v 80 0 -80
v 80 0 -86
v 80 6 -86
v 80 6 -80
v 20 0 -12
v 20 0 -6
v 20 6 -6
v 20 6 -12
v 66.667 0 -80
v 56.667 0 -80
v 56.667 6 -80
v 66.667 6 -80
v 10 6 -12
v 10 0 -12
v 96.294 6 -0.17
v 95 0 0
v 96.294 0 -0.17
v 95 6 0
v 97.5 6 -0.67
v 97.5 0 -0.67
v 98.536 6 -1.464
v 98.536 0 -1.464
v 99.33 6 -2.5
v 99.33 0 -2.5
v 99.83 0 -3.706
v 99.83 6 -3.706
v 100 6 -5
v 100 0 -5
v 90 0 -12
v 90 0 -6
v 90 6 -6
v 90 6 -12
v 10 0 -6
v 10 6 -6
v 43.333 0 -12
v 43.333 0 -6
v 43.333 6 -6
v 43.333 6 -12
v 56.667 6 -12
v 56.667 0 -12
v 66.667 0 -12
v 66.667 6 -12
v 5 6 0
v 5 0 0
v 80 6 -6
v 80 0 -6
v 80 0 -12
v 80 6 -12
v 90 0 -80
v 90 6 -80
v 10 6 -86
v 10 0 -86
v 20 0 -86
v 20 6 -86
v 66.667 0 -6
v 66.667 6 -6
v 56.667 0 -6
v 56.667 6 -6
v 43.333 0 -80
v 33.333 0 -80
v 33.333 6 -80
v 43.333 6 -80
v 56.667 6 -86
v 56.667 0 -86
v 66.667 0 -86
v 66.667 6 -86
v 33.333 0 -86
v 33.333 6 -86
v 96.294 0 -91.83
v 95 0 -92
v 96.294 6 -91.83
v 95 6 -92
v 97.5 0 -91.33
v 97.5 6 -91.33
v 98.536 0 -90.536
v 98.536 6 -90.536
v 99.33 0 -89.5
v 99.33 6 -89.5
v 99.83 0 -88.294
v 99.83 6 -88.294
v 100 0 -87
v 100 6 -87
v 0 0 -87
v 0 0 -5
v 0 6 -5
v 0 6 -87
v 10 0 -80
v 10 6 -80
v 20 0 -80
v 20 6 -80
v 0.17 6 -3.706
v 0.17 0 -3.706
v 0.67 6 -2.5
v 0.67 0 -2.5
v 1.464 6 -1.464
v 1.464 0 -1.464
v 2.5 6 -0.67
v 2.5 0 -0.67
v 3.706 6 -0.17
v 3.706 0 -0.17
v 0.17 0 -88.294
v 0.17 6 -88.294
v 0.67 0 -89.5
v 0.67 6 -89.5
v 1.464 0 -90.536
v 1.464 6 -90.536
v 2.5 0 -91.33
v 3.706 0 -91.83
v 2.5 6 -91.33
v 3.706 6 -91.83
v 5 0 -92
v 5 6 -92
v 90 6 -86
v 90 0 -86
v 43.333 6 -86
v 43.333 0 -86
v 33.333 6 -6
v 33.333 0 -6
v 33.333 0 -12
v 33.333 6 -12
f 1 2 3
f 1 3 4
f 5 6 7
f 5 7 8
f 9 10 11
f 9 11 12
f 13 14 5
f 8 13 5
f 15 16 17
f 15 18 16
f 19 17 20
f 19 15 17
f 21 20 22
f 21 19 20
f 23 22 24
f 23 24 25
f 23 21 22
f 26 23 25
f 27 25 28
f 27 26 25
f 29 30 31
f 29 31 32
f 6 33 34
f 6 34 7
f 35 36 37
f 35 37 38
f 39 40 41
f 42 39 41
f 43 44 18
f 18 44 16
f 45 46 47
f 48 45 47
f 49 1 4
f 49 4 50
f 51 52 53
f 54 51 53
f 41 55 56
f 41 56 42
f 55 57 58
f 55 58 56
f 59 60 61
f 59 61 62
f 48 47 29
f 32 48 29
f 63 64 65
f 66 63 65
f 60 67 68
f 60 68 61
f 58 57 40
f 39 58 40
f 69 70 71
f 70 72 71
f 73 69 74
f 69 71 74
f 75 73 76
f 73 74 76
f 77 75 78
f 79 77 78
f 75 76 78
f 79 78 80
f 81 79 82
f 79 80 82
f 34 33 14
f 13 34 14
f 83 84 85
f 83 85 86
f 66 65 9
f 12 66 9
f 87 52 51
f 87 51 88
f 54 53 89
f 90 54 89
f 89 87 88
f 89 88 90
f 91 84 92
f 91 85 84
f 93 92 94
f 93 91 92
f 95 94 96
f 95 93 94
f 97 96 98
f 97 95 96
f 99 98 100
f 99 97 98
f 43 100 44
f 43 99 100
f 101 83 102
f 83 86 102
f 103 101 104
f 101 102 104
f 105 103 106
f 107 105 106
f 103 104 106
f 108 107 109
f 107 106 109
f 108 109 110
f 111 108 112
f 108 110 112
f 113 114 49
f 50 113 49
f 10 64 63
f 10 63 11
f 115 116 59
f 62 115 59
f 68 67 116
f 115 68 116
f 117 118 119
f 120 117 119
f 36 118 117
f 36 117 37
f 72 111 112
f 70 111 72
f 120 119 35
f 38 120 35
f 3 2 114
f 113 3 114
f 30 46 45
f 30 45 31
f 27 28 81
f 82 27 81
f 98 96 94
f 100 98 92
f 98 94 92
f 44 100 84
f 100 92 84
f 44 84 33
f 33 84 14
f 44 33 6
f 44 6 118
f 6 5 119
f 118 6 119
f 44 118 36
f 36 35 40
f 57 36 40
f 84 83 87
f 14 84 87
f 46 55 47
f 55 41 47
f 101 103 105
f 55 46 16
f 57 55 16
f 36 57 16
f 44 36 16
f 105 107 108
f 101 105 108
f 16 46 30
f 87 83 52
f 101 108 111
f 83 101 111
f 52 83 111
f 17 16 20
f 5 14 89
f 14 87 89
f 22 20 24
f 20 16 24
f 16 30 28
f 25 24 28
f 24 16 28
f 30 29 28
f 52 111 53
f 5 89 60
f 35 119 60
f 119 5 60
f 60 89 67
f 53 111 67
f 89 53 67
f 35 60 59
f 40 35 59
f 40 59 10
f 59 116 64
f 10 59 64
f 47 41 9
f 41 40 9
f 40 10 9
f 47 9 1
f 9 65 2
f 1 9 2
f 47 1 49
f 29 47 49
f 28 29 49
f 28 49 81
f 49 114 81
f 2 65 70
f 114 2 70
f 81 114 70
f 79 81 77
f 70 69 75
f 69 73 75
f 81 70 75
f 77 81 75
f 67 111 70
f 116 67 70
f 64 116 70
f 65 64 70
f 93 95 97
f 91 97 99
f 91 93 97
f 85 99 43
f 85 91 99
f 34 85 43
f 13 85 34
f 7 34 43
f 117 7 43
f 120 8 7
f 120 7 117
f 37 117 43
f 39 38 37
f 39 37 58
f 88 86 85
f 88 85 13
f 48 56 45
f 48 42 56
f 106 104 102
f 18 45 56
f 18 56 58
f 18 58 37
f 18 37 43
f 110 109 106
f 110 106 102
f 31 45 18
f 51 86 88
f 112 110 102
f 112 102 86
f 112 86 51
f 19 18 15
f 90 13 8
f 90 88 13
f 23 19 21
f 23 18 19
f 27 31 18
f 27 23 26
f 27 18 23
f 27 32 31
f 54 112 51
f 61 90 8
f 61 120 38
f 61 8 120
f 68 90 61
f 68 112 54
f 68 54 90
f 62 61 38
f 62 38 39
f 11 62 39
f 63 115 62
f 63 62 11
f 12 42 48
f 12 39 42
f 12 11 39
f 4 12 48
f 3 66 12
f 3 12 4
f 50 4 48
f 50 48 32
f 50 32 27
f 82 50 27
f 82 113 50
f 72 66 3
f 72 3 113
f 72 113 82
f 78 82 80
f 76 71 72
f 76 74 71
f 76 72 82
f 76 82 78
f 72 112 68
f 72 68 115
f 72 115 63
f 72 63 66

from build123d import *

# Parameters (mm, degrees)
SKETCH1_W           = 100
SKETCH1_H           = 92
BOSS_EXTRUDE1_DEPTH = 6
SKETCH6_W           = 10
SKETCH6_H           = 6
CUT_EXTRUDE1_DEPTH  = 4
SKETCH61_W          = 10
SKETCH61_H          = 6
CUT_EXTRUDE11_DEPTH = 4
SKETCH62_W          = 10
SKETCH62_H          = 6
CUT_EXTRUDE12_DEPTH = 4
SKETCH63_W          = 10
SKETCH63_H          = 6
CUT_EXTRUDE13_DEPTH = 4
FILLET1_R           = 5


with BuildPart() as part:
    # Sketch1 → Boss-Extrude1 (new body)
    with BuildSketch(Plane(origin=(0, 0, 0), x_dir=(1, 0, 0), z_dir=(0, 1, 0))):
        with Locations((50, 46)):
            Rectangle(SKETCH1_W, SKETCH1_H)
    extrude(amount=BOSS_EXTRUDE1_DEPTH)

    # Sketch6 → Cut-Extrude1 (cut, symmetric)
    with BuildSketch(Plane(origin=(84.232221392, 3, -39), x_dir=(1, 0, 0), z_dir=(0, -1, 0))):
        with Locations((0.767778608, -44)):
            Rectangle(SKETCH6_W, SKETCH6_H)
    cut_extrude1 = extrude(amount=CUT_EXTRUDE1_DEPTH, both=True, mode=Mode.SUBTRACT)

    # Sketch61 → Cut-Extrude11 (cut, symmetric)
    with BuildSketch(Plane(origin=(60.898888059, 3, -39), x_dir=(1, 0, 0), z_dir=(0, -1, 0))):
        with Locations((0.767778608, -44)):
            Rectangle(SKETCH61_W, SKETCH61_H)
    cut_extrude11 = extrude(amount=CUT_EXTRUDE11_DEPTH, both=True, mode=Mode.SUBTRACT)

    # Sketch62 → Cut-Extrude12 (cut, symmetric)
    with BuildSketch(Plane(origin=(37.565554726, 3, -39), x_dir=(1, 0, 0), z_dir=(0, -1, 0))):
        with Locations((0.767778608, -44)):
            Rectangle(SKETCH62_W, SKETCH62_H)
    cut_extrude12 = extrude(amount=CUT_EXTRUDE12_DEPTH, both=True, mode=Mode.SUBTRACT)

    # Sketch63 → Cut-Extrude13 (cut, symmetric)
    with BuildSketch(Plane(origin=(14.232221392, 3, -39), x_dir=(1, 0, 0), z_dir=(0, -1, 0))):
        with Locations((0.767778608, -44)):
            Rectangle(SKETCH63_W, SKETCH63_H)
    cut_extrude13 = extrude(amount=CUT_EXTRUDE13_DEPTH, both=True, mode=Mode.SUBTRACT)

    # Mirror1: Cut-Extrude1, Cut-Extrude11, Cut-Extrude12, Cut-Extrude13 across plane
    add(cut_extrude1.mirror(Plane(origin=(0, 0, -46), x_dir=(1, 0, 0), z_dir=(0, 0, -1))), mode=Mode.SUBTRACT)
    add(cut_extrude11.mirror(Plane(origin=(0, 0, -46), x_dir=(1, 0, 0), z_dir=(0, 0, -1))), mode=Mode.SUBTRACT)
    add(cut_extrude12.mirror(Plane(origin=(0, 0, -46), x_dir=(1, 0, 0), z_dir=(0, 0, -1))), mode=Mode.SUBTRACT)
    add(cut_extrude13.mirror(Plane(origin=(0, 0, -46), x_dir=(1, 0, 0), z_dir=(0, 0, -1))), mode=Mode.SUBTRACT)

    # Fillet1
    fillet1_edges = [part.edges().sort_by_distance(p)[0] for p in [
        (0, 3, -92),
        (100, 3, -92),
        (100, 3, 0),
        (0, 3, 0),
    ]]
    fillet(fillet1_edges, radius=FILLET1_R)


solid = part.part
